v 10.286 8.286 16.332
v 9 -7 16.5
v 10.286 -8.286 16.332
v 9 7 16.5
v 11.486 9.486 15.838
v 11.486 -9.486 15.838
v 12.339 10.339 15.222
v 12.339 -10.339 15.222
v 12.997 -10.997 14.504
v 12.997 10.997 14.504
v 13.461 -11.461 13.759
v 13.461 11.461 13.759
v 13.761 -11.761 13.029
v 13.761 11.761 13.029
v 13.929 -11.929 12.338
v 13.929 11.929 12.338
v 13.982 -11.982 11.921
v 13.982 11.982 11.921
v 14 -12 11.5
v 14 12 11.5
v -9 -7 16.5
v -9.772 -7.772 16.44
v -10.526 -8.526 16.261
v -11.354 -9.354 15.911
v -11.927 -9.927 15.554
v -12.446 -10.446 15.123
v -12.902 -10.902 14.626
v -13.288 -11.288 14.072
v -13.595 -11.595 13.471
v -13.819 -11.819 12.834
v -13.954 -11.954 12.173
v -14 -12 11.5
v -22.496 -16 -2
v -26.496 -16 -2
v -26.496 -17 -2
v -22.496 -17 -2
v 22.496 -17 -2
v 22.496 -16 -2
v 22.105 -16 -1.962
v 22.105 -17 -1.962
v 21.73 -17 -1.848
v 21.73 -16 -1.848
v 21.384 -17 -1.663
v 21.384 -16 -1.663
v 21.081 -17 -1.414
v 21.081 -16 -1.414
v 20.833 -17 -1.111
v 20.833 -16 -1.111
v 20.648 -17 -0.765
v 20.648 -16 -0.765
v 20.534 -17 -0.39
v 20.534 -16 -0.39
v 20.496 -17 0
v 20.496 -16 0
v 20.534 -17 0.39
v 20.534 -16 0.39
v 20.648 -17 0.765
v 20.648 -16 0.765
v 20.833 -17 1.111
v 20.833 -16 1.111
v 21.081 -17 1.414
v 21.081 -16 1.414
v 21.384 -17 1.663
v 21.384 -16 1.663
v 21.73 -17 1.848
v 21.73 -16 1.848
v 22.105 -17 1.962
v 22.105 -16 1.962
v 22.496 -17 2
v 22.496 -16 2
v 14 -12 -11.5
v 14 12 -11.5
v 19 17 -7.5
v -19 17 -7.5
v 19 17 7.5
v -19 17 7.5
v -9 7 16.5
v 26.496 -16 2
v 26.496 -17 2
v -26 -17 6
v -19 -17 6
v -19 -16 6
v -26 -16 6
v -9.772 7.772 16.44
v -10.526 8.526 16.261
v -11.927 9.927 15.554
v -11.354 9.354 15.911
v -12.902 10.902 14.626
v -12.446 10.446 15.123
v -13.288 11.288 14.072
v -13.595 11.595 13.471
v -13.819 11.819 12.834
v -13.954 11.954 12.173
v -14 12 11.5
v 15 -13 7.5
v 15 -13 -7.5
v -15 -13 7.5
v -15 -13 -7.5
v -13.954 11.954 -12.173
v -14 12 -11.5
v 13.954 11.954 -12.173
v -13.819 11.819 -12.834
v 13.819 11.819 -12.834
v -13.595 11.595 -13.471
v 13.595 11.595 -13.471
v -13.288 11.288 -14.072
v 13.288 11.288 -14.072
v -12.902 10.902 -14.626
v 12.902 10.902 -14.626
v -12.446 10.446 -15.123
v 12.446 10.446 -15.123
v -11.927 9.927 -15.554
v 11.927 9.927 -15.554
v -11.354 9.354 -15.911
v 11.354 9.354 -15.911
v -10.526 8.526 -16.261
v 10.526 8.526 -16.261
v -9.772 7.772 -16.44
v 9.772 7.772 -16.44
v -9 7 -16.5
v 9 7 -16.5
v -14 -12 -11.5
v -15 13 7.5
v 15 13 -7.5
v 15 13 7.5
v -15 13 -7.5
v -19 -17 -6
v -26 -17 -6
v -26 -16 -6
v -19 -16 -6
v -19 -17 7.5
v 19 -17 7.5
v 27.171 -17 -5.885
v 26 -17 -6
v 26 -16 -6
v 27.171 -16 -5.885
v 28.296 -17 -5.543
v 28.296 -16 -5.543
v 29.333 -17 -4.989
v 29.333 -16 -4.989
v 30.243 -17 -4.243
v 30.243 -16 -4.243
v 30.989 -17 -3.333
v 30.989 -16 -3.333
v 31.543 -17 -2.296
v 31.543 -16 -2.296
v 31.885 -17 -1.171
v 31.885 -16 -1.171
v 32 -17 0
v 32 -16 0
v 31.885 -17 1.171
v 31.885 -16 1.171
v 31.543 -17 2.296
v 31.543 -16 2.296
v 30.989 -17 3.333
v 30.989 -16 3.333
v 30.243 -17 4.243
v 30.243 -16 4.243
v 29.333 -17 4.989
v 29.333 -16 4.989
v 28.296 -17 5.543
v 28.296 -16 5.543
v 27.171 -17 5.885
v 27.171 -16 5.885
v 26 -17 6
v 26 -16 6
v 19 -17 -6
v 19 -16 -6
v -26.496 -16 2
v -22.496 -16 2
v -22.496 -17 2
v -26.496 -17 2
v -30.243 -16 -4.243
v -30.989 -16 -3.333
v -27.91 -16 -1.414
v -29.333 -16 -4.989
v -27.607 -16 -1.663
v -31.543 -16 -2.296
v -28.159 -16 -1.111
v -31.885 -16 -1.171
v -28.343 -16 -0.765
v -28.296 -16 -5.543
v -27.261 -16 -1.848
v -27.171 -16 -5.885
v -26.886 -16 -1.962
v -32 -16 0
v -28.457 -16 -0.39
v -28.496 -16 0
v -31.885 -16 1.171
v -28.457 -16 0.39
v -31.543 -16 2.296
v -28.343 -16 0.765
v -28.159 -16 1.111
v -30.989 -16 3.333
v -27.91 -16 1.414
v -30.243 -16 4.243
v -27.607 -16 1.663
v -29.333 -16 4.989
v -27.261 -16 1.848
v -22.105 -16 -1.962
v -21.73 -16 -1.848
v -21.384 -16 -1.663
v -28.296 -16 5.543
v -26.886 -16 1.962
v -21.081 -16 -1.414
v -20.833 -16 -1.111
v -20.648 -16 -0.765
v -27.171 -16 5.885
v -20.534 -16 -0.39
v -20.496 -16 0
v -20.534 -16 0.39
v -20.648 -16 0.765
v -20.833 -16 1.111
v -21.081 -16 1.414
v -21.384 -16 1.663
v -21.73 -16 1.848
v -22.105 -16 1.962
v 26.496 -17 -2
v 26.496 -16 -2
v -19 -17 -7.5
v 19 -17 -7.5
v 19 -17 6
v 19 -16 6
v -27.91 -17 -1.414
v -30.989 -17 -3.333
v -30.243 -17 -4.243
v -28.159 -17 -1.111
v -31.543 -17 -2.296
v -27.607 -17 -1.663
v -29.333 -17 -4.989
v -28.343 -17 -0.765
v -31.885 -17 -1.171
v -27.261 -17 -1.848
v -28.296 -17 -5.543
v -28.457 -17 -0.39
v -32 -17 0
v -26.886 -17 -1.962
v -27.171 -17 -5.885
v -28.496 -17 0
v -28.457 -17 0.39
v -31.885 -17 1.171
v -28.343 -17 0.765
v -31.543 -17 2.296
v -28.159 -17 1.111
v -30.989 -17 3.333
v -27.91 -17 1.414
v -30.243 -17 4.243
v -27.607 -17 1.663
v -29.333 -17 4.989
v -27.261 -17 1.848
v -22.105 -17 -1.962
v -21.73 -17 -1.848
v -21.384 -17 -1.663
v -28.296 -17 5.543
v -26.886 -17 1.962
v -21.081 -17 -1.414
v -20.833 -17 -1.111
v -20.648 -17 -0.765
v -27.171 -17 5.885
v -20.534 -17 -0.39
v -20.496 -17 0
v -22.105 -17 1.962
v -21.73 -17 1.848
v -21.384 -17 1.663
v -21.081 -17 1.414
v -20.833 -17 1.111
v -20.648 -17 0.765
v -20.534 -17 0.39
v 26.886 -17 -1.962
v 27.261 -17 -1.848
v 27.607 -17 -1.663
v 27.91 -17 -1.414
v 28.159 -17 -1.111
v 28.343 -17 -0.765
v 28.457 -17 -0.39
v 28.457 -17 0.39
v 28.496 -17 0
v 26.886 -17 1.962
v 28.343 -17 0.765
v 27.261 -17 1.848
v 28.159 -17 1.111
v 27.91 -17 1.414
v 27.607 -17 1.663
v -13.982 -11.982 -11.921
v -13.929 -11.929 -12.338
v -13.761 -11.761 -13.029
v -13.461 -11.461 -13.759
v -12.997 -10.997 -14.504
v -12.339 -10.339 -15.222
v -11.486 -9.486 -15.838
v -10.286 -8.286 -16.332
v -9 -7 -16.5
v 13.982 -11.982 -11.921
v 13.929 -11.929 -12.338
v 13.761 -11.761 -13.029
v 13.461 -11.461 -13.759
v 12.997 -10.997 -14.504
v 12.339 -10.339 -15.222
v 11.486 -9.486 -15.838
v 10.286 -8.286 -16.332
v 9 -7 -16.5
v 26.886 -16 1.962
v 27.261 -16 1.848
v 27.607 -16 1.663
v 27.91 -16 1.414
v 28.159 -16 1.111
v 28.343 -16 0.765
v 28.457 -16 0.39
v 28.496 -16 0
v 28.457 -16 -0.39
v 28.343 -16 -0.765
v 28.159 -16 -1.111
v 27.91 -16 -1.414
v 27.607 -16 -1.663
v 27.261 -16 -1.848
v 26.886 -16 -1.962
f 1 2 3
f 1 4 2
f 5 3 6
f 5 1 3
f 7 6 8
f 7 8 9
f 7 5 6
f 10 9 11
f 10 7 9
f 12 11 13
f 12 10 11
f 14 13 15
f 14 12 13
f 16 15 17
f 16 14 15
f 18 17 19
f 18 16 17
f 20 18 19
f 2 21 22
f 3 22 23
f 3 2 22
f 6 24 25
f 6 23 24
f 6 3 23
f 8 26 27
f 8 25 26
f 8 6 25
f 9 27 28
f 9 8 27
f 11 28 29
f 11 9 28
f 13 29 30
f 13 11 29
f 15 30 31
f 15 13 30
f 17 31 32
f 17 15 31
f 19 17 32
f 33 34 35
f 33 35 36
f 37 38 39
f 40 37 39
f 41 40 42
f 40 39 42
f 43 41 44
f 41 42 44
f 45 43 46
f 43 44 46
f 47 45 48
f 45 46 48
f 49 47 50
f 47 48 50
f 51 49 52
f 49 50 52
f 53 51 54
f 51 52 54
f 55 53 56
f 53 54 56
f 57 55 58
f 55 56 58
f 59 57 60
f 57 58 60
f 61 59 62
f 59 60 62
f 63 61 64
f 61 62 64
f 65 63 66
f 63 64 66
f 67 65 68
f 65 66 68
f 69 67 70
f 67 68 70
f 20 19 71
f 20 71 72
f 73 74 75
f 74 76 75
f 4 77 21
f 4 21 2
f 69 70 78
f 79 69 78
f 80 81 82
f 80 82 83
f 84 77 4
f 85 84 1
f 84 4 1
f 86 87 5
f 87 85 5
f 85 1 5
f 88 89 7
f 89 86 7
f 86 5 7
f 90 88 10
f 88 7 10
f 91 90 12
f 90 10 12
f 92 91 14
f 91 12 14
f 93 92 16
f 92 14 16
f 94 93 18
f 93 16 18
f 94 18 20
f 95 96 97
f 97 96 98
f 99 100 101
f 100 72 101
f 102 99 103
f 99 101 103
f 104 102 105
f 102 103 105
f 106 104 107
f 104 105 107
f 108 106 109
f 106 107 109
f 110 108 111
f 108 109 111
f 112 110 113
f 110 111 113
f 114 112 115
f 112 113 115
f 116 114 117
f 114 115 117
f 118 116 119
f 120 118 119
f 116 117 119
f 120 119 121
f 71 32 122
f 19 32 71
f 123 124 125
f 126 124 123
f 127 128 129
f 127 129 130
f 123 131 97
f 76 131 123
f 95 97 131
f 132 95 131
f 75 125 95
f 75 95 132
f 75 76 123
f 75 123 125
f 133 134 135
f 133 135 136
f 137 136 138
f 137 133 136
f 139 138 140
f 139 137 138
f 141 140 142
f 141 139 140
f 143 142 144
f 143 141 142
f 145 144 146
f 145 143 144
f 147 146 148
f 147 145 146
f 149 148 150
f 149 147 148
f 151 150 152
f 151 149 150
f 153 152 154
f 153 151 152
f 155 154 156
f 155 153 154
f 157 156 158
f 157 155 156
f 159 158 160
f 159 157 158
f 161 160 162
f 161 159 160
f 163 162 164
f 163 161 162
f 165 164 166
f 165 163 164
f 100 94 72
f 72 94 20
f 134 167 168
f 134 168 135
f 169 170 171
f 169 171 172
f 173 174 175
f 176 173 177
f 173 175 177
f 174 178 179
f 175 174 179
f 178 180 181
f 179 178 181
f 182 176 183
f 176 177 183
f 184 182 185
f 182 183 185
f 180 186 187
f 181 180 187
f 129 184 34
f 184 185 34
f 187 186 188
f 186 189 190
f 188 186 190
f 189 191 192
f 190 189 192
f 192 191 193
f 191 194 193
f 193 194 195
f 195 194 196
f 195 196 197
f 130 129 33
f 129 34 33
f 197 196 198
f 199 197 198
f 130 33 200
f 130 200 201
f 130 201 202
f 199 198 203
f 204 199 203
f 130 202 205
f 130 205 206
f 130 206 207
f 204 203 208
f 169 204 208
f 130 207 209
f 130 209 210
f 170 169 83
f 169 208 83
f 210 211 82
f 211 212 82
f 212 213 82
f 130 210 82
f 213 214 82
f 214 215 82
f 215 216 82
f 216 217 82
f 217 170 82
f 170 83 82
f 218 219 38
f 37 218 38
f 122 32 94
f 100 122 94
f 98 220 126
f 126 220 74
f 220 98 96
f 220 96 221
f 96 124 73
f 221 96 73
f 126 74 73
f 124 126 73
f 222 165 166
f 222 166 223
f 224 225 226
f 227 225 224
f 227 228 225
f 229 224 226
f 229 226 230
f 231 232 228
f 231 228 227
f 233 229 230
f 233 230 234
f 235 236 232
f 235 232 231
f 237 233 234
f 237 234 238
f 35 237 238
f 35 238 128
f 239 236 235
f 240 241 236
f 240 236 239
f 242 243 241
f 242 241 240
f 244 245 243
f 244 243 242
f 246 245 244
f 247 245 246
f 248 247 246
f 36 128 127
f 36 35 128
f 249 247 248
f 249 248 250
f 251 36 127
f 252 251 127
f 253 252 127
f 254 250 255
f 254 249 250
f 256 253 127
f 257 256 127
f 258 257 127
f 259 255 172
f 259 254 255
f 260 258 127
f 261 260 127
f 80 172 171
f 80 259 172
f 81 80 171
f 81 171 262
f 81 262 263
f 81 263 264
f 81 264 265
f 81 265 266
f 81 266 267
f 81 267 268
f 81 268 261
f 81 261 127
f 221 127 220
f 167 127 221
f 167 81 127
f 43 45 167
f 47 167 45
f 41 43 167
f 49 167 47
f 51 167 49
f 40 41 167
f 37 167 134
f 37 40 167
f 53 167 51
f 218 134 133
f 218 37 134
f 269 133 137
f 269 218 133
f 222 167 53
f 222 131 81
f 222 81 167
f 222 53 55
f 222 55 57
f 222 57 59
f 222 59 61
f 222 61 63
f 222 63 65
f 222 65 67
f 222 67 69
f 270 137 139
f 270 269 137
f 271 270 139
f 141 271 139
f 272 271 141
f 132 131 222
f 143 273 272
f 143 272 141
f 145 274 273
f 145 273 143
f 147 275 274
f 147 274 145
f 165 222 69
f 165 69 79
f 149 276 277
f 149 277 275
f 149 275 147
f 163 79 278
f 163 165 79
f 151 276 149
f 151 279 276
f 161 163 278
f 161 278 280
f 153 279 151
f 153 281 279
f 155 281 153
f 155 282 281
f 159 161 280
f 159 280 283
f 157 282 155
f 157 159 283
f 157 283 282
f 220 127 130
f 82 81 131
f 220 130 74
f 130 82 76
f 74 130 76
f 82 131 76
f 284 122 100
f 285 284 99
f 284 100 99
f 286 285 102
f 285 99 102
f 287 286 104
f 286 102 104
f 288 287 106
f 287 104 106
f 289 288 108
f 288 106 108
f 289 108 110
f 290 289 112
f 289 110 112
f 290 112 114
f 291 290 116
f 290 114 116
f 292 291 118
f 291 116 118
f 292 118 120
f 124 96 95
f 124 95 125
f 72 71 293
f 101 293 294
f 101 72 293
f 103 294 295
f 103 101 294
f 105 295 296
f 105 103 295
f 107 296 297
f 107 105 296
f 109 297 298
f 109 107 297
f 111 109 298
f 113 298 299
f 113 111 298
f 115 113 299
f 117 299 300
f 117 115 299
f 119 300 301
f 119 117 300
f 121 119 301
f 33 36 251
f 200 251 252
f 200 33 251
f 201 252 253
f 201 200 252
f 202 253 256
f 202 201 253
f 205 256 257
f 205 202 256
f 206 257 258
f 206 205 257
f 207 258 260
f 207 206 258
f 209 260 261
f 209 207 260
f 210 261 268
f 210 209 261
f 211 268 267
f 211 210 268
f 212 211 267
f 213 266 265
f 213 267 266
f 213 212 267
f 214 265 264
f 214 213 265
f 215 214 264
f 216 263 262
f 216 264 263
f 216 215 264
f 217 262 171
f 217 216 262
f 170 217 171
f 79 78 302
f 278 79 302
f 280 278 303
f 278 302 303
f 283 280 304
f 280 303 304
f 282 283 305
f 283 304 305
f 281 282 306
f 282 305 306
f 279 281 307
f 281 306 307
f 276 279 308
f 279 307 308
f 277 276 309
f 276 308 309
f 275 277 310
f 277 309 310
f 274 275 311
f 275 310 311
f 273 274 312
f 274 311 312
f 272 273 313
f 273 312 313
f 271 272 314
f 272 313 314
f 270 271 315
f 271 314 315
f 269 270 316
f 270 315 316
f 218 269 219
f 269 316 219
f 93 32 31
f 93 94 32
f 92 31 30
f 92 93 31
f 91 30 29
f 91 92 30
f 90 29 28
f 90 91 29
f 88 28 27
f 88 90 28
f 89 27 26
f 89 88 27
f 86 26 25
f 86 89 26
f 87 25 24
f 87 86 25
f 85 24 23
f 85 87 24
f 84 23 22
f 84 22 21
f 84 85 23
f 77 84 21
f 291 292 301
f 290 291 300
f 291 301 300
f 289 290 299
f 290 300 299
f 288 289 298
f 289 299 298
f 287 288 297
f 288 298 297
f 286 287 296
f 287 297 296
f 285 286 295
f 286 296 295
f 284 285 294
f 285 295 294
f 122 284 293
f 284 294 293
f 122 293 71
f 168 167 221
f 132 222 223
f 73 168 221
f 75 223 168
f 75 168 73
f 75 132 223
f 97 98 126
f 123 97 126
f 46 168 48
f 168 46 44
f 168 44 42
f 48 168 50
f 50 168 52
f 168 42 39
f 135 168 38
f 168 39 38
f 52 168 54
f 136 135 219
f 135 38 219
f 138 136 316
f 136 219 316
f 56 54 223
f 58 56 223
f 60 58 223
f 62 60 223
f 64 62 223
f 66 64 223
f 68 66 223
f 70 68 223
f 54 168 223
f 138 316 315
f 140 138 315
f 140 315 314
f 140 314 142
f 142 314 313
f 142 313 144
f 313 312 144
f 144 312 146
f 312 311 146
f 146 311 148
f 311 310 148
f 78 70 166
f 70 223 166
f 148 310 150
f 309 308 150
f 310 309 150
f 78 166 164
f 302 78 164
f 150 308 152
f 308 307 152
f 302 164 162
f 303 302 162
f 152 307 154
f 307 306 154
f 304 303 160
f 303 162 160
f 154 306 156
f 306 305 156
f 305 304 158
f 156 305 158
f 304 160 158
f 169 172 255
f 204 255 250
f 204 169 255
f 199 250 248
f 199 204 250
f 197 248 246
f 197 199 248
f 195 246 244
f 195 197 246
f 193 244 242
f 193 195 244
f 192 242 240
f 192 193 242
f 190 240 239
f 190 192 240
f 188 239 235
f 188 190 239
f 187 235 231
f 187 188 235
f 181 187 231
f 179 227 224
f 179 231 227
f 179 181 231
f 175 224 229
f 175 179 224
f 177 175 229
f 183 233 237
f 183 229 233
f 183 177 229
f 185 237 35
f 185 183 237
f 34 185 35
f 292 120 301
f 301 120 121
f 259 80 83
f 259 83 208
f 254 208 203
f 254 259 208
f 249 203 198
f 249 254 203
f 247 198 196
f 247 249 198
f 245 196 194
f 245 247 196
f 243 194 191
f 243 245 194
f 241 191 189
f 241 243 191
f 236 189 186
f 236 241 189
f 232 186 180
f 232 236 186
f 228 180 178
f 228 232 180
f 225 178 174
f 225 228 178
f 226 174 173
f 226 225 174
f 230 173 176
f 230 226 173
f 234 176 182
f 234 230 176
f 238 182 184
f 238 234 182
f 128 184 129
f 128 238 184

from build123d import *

# Parameters (mm, degrees)
SKETCH1_W           = 38
SKETCH1_H           = 34
BOSS_EXTRUDE1_DEPTH = 7.5
BOSS_EXTRUDE2_DEPTH = 1
CUT_EXTRUDE1_REACH  = 48.575
CUT_EXTRUDE2_REACH  = 41.217
SKETCH4_W           = 30
SKETCH4_H           = 26
SKETCH5_W           = 28
SKETCH5_H           = 24
BOSS_EXTRUDE3_DEPTH = 16.5
FILLET1_R           = 5


with BuildPart() as part:
    # Sketch1 → Boss-Extrude1 (new, symmetric)
    with BuildSketch(Plane.XY):
        Rectangle(SKETCH1_W, SKETCH1_H)
    extrude(amount=BOSS_EXTRUDE1_DEPTH, both=True)

    # Sketch2 → Boss-Extrude2 (add)
    with BuildSketch(Plane.XZ.offset(17)):
        with BuildLine():
            Line((19, 6), (19, -6))
            Line((19, -6), (26, -6))
            ThreePointArc((26, -6), (32, 0), (26, 6))
            Line((26, 6), (19, 6))
        make_face()
        with BuildLine():
            Line((-26, -6), (-19, -6))
            Line((-19, -6), (-19, 6))
            Line((-19, 6), (-26, 6))
            ThreePointArc((-26, 6), (-32, 0), (-26, -6))
        make_face()
    extrude(amount=-BOSS_EXTRUDE2_DEPTH)

    # Sketch3 → Cut-Extrude1 (cut, up to next)
    with BuildSketch(Plane(origin=(0, -16, 0), x_dir=(1, 0, 0), z_dir=(0, 1, 0)), mode=Mode.PRIVATE) as cut_extrude1_sk1:
        with BuildLine():
            Line((-22.495625059, -2), (-26.495625059, -2))
            ThreePointArc((-26.495625059, -2), (-28.495625059, 0), (-26.495625059, 2))
            Line((-26.495625059, 2), (-22.495625059, 2))
            ThreePointArc((-22.495625059, 2), (-20.495625059, 0), (-22.495625059, -2))
        make_face()
    cut_extrude1_tool1 = extrude(cut_extrude1_sk1.sketch, amount=-CUT_EXTRUDE1_REACH, mode=Mode.PRIVATE) & part.part
    # Sketch3 → Cut-Extrude1 (cut, up to next)
    with BuildSketch(Plane(origin=(0, -16, 0), x_dir=(1, 0, 0), z_dir=(0, 1, 0)), mode=Mode.PRIVATE) as cut_extrude1_sk2:
        with BuildLine():
            Line((22.495625059, -2), (26.495625059, -2))
            ThreePointArc((26.495625059, -2), (28.495625059, 0), (26.495625059, 2))
            Line((26.495625059, 2), (22.495625059, 2))
            ThreePointArc((22.495625059, 2), (20.495625059, 0), (22.495625059, -2))
        make_face()
    cut_extrude1_tool2 = extrude(cut_extrude1_sk2.sketch, amount=-CUT_EXTRUDE1_REACH, mode=Mode.PRIVATE) & part.part
    add(cut_extrude1_tool1.solids().sort_by_distance((-24.495625, -16, 0))[0], mode=Mode.SUBTRACT)
    add(cut_extrude1_tool2.solids().sort_by_distance((24.495625, -16, 0))[0], mode=Mode.SUBTRACT)

    # Sketch4 → Cut-Extrude2 (cut, up to next)
    with BuildSketch(Plane(origin=(0, 0, -7.5), x_dir=(-1, 0, 0), z_dir=(0, 0, -1)), mode=Mode.PRIVATE) as cut_extrude2_sk1:
        Rectangle(SKETCH4_W, SKETCH4_H)
    cut_extrude2_tool1 = extrude(cut_extrude2_sk1.sketch, amount=-CUT_EXTRUDE2_REACH, mode=Mode.PRIVATE) & part.part
    add(cut_extrude2_tool1.solids().sort_by_distance((0, 0, -7.5))[0], mode=Mode.SUBTRACT)


with BuildPart() as body_2:
    # Sketch5 → Boss-Extrude3 (new, symmetric)
    with BuildSketch(Plane.XY):
        Rectangle(SKETCH5_W, SKETCH5_H)
    extrude(amount=BOSS_EXTRUDE3_DEPTH, both=True)

    # Fillet1
    fillet1_edges = [body_2.edges().sort_by_distance(p)[0] for p in [
        (-14, 0, 16.5),
        (0, -12, 16.5),
        (14, 0, 16.5),
        (0, -12, -16.5),
        (-14, 0, -16.5),
        (0, 12, -16.5),
        (14, 0, -16.5),
        (0, 12, 16.5),
    ]]
    fillet(fillet1_edges, radius=FILLET1_R)


solid = Compound([part.part, body_2.part])
